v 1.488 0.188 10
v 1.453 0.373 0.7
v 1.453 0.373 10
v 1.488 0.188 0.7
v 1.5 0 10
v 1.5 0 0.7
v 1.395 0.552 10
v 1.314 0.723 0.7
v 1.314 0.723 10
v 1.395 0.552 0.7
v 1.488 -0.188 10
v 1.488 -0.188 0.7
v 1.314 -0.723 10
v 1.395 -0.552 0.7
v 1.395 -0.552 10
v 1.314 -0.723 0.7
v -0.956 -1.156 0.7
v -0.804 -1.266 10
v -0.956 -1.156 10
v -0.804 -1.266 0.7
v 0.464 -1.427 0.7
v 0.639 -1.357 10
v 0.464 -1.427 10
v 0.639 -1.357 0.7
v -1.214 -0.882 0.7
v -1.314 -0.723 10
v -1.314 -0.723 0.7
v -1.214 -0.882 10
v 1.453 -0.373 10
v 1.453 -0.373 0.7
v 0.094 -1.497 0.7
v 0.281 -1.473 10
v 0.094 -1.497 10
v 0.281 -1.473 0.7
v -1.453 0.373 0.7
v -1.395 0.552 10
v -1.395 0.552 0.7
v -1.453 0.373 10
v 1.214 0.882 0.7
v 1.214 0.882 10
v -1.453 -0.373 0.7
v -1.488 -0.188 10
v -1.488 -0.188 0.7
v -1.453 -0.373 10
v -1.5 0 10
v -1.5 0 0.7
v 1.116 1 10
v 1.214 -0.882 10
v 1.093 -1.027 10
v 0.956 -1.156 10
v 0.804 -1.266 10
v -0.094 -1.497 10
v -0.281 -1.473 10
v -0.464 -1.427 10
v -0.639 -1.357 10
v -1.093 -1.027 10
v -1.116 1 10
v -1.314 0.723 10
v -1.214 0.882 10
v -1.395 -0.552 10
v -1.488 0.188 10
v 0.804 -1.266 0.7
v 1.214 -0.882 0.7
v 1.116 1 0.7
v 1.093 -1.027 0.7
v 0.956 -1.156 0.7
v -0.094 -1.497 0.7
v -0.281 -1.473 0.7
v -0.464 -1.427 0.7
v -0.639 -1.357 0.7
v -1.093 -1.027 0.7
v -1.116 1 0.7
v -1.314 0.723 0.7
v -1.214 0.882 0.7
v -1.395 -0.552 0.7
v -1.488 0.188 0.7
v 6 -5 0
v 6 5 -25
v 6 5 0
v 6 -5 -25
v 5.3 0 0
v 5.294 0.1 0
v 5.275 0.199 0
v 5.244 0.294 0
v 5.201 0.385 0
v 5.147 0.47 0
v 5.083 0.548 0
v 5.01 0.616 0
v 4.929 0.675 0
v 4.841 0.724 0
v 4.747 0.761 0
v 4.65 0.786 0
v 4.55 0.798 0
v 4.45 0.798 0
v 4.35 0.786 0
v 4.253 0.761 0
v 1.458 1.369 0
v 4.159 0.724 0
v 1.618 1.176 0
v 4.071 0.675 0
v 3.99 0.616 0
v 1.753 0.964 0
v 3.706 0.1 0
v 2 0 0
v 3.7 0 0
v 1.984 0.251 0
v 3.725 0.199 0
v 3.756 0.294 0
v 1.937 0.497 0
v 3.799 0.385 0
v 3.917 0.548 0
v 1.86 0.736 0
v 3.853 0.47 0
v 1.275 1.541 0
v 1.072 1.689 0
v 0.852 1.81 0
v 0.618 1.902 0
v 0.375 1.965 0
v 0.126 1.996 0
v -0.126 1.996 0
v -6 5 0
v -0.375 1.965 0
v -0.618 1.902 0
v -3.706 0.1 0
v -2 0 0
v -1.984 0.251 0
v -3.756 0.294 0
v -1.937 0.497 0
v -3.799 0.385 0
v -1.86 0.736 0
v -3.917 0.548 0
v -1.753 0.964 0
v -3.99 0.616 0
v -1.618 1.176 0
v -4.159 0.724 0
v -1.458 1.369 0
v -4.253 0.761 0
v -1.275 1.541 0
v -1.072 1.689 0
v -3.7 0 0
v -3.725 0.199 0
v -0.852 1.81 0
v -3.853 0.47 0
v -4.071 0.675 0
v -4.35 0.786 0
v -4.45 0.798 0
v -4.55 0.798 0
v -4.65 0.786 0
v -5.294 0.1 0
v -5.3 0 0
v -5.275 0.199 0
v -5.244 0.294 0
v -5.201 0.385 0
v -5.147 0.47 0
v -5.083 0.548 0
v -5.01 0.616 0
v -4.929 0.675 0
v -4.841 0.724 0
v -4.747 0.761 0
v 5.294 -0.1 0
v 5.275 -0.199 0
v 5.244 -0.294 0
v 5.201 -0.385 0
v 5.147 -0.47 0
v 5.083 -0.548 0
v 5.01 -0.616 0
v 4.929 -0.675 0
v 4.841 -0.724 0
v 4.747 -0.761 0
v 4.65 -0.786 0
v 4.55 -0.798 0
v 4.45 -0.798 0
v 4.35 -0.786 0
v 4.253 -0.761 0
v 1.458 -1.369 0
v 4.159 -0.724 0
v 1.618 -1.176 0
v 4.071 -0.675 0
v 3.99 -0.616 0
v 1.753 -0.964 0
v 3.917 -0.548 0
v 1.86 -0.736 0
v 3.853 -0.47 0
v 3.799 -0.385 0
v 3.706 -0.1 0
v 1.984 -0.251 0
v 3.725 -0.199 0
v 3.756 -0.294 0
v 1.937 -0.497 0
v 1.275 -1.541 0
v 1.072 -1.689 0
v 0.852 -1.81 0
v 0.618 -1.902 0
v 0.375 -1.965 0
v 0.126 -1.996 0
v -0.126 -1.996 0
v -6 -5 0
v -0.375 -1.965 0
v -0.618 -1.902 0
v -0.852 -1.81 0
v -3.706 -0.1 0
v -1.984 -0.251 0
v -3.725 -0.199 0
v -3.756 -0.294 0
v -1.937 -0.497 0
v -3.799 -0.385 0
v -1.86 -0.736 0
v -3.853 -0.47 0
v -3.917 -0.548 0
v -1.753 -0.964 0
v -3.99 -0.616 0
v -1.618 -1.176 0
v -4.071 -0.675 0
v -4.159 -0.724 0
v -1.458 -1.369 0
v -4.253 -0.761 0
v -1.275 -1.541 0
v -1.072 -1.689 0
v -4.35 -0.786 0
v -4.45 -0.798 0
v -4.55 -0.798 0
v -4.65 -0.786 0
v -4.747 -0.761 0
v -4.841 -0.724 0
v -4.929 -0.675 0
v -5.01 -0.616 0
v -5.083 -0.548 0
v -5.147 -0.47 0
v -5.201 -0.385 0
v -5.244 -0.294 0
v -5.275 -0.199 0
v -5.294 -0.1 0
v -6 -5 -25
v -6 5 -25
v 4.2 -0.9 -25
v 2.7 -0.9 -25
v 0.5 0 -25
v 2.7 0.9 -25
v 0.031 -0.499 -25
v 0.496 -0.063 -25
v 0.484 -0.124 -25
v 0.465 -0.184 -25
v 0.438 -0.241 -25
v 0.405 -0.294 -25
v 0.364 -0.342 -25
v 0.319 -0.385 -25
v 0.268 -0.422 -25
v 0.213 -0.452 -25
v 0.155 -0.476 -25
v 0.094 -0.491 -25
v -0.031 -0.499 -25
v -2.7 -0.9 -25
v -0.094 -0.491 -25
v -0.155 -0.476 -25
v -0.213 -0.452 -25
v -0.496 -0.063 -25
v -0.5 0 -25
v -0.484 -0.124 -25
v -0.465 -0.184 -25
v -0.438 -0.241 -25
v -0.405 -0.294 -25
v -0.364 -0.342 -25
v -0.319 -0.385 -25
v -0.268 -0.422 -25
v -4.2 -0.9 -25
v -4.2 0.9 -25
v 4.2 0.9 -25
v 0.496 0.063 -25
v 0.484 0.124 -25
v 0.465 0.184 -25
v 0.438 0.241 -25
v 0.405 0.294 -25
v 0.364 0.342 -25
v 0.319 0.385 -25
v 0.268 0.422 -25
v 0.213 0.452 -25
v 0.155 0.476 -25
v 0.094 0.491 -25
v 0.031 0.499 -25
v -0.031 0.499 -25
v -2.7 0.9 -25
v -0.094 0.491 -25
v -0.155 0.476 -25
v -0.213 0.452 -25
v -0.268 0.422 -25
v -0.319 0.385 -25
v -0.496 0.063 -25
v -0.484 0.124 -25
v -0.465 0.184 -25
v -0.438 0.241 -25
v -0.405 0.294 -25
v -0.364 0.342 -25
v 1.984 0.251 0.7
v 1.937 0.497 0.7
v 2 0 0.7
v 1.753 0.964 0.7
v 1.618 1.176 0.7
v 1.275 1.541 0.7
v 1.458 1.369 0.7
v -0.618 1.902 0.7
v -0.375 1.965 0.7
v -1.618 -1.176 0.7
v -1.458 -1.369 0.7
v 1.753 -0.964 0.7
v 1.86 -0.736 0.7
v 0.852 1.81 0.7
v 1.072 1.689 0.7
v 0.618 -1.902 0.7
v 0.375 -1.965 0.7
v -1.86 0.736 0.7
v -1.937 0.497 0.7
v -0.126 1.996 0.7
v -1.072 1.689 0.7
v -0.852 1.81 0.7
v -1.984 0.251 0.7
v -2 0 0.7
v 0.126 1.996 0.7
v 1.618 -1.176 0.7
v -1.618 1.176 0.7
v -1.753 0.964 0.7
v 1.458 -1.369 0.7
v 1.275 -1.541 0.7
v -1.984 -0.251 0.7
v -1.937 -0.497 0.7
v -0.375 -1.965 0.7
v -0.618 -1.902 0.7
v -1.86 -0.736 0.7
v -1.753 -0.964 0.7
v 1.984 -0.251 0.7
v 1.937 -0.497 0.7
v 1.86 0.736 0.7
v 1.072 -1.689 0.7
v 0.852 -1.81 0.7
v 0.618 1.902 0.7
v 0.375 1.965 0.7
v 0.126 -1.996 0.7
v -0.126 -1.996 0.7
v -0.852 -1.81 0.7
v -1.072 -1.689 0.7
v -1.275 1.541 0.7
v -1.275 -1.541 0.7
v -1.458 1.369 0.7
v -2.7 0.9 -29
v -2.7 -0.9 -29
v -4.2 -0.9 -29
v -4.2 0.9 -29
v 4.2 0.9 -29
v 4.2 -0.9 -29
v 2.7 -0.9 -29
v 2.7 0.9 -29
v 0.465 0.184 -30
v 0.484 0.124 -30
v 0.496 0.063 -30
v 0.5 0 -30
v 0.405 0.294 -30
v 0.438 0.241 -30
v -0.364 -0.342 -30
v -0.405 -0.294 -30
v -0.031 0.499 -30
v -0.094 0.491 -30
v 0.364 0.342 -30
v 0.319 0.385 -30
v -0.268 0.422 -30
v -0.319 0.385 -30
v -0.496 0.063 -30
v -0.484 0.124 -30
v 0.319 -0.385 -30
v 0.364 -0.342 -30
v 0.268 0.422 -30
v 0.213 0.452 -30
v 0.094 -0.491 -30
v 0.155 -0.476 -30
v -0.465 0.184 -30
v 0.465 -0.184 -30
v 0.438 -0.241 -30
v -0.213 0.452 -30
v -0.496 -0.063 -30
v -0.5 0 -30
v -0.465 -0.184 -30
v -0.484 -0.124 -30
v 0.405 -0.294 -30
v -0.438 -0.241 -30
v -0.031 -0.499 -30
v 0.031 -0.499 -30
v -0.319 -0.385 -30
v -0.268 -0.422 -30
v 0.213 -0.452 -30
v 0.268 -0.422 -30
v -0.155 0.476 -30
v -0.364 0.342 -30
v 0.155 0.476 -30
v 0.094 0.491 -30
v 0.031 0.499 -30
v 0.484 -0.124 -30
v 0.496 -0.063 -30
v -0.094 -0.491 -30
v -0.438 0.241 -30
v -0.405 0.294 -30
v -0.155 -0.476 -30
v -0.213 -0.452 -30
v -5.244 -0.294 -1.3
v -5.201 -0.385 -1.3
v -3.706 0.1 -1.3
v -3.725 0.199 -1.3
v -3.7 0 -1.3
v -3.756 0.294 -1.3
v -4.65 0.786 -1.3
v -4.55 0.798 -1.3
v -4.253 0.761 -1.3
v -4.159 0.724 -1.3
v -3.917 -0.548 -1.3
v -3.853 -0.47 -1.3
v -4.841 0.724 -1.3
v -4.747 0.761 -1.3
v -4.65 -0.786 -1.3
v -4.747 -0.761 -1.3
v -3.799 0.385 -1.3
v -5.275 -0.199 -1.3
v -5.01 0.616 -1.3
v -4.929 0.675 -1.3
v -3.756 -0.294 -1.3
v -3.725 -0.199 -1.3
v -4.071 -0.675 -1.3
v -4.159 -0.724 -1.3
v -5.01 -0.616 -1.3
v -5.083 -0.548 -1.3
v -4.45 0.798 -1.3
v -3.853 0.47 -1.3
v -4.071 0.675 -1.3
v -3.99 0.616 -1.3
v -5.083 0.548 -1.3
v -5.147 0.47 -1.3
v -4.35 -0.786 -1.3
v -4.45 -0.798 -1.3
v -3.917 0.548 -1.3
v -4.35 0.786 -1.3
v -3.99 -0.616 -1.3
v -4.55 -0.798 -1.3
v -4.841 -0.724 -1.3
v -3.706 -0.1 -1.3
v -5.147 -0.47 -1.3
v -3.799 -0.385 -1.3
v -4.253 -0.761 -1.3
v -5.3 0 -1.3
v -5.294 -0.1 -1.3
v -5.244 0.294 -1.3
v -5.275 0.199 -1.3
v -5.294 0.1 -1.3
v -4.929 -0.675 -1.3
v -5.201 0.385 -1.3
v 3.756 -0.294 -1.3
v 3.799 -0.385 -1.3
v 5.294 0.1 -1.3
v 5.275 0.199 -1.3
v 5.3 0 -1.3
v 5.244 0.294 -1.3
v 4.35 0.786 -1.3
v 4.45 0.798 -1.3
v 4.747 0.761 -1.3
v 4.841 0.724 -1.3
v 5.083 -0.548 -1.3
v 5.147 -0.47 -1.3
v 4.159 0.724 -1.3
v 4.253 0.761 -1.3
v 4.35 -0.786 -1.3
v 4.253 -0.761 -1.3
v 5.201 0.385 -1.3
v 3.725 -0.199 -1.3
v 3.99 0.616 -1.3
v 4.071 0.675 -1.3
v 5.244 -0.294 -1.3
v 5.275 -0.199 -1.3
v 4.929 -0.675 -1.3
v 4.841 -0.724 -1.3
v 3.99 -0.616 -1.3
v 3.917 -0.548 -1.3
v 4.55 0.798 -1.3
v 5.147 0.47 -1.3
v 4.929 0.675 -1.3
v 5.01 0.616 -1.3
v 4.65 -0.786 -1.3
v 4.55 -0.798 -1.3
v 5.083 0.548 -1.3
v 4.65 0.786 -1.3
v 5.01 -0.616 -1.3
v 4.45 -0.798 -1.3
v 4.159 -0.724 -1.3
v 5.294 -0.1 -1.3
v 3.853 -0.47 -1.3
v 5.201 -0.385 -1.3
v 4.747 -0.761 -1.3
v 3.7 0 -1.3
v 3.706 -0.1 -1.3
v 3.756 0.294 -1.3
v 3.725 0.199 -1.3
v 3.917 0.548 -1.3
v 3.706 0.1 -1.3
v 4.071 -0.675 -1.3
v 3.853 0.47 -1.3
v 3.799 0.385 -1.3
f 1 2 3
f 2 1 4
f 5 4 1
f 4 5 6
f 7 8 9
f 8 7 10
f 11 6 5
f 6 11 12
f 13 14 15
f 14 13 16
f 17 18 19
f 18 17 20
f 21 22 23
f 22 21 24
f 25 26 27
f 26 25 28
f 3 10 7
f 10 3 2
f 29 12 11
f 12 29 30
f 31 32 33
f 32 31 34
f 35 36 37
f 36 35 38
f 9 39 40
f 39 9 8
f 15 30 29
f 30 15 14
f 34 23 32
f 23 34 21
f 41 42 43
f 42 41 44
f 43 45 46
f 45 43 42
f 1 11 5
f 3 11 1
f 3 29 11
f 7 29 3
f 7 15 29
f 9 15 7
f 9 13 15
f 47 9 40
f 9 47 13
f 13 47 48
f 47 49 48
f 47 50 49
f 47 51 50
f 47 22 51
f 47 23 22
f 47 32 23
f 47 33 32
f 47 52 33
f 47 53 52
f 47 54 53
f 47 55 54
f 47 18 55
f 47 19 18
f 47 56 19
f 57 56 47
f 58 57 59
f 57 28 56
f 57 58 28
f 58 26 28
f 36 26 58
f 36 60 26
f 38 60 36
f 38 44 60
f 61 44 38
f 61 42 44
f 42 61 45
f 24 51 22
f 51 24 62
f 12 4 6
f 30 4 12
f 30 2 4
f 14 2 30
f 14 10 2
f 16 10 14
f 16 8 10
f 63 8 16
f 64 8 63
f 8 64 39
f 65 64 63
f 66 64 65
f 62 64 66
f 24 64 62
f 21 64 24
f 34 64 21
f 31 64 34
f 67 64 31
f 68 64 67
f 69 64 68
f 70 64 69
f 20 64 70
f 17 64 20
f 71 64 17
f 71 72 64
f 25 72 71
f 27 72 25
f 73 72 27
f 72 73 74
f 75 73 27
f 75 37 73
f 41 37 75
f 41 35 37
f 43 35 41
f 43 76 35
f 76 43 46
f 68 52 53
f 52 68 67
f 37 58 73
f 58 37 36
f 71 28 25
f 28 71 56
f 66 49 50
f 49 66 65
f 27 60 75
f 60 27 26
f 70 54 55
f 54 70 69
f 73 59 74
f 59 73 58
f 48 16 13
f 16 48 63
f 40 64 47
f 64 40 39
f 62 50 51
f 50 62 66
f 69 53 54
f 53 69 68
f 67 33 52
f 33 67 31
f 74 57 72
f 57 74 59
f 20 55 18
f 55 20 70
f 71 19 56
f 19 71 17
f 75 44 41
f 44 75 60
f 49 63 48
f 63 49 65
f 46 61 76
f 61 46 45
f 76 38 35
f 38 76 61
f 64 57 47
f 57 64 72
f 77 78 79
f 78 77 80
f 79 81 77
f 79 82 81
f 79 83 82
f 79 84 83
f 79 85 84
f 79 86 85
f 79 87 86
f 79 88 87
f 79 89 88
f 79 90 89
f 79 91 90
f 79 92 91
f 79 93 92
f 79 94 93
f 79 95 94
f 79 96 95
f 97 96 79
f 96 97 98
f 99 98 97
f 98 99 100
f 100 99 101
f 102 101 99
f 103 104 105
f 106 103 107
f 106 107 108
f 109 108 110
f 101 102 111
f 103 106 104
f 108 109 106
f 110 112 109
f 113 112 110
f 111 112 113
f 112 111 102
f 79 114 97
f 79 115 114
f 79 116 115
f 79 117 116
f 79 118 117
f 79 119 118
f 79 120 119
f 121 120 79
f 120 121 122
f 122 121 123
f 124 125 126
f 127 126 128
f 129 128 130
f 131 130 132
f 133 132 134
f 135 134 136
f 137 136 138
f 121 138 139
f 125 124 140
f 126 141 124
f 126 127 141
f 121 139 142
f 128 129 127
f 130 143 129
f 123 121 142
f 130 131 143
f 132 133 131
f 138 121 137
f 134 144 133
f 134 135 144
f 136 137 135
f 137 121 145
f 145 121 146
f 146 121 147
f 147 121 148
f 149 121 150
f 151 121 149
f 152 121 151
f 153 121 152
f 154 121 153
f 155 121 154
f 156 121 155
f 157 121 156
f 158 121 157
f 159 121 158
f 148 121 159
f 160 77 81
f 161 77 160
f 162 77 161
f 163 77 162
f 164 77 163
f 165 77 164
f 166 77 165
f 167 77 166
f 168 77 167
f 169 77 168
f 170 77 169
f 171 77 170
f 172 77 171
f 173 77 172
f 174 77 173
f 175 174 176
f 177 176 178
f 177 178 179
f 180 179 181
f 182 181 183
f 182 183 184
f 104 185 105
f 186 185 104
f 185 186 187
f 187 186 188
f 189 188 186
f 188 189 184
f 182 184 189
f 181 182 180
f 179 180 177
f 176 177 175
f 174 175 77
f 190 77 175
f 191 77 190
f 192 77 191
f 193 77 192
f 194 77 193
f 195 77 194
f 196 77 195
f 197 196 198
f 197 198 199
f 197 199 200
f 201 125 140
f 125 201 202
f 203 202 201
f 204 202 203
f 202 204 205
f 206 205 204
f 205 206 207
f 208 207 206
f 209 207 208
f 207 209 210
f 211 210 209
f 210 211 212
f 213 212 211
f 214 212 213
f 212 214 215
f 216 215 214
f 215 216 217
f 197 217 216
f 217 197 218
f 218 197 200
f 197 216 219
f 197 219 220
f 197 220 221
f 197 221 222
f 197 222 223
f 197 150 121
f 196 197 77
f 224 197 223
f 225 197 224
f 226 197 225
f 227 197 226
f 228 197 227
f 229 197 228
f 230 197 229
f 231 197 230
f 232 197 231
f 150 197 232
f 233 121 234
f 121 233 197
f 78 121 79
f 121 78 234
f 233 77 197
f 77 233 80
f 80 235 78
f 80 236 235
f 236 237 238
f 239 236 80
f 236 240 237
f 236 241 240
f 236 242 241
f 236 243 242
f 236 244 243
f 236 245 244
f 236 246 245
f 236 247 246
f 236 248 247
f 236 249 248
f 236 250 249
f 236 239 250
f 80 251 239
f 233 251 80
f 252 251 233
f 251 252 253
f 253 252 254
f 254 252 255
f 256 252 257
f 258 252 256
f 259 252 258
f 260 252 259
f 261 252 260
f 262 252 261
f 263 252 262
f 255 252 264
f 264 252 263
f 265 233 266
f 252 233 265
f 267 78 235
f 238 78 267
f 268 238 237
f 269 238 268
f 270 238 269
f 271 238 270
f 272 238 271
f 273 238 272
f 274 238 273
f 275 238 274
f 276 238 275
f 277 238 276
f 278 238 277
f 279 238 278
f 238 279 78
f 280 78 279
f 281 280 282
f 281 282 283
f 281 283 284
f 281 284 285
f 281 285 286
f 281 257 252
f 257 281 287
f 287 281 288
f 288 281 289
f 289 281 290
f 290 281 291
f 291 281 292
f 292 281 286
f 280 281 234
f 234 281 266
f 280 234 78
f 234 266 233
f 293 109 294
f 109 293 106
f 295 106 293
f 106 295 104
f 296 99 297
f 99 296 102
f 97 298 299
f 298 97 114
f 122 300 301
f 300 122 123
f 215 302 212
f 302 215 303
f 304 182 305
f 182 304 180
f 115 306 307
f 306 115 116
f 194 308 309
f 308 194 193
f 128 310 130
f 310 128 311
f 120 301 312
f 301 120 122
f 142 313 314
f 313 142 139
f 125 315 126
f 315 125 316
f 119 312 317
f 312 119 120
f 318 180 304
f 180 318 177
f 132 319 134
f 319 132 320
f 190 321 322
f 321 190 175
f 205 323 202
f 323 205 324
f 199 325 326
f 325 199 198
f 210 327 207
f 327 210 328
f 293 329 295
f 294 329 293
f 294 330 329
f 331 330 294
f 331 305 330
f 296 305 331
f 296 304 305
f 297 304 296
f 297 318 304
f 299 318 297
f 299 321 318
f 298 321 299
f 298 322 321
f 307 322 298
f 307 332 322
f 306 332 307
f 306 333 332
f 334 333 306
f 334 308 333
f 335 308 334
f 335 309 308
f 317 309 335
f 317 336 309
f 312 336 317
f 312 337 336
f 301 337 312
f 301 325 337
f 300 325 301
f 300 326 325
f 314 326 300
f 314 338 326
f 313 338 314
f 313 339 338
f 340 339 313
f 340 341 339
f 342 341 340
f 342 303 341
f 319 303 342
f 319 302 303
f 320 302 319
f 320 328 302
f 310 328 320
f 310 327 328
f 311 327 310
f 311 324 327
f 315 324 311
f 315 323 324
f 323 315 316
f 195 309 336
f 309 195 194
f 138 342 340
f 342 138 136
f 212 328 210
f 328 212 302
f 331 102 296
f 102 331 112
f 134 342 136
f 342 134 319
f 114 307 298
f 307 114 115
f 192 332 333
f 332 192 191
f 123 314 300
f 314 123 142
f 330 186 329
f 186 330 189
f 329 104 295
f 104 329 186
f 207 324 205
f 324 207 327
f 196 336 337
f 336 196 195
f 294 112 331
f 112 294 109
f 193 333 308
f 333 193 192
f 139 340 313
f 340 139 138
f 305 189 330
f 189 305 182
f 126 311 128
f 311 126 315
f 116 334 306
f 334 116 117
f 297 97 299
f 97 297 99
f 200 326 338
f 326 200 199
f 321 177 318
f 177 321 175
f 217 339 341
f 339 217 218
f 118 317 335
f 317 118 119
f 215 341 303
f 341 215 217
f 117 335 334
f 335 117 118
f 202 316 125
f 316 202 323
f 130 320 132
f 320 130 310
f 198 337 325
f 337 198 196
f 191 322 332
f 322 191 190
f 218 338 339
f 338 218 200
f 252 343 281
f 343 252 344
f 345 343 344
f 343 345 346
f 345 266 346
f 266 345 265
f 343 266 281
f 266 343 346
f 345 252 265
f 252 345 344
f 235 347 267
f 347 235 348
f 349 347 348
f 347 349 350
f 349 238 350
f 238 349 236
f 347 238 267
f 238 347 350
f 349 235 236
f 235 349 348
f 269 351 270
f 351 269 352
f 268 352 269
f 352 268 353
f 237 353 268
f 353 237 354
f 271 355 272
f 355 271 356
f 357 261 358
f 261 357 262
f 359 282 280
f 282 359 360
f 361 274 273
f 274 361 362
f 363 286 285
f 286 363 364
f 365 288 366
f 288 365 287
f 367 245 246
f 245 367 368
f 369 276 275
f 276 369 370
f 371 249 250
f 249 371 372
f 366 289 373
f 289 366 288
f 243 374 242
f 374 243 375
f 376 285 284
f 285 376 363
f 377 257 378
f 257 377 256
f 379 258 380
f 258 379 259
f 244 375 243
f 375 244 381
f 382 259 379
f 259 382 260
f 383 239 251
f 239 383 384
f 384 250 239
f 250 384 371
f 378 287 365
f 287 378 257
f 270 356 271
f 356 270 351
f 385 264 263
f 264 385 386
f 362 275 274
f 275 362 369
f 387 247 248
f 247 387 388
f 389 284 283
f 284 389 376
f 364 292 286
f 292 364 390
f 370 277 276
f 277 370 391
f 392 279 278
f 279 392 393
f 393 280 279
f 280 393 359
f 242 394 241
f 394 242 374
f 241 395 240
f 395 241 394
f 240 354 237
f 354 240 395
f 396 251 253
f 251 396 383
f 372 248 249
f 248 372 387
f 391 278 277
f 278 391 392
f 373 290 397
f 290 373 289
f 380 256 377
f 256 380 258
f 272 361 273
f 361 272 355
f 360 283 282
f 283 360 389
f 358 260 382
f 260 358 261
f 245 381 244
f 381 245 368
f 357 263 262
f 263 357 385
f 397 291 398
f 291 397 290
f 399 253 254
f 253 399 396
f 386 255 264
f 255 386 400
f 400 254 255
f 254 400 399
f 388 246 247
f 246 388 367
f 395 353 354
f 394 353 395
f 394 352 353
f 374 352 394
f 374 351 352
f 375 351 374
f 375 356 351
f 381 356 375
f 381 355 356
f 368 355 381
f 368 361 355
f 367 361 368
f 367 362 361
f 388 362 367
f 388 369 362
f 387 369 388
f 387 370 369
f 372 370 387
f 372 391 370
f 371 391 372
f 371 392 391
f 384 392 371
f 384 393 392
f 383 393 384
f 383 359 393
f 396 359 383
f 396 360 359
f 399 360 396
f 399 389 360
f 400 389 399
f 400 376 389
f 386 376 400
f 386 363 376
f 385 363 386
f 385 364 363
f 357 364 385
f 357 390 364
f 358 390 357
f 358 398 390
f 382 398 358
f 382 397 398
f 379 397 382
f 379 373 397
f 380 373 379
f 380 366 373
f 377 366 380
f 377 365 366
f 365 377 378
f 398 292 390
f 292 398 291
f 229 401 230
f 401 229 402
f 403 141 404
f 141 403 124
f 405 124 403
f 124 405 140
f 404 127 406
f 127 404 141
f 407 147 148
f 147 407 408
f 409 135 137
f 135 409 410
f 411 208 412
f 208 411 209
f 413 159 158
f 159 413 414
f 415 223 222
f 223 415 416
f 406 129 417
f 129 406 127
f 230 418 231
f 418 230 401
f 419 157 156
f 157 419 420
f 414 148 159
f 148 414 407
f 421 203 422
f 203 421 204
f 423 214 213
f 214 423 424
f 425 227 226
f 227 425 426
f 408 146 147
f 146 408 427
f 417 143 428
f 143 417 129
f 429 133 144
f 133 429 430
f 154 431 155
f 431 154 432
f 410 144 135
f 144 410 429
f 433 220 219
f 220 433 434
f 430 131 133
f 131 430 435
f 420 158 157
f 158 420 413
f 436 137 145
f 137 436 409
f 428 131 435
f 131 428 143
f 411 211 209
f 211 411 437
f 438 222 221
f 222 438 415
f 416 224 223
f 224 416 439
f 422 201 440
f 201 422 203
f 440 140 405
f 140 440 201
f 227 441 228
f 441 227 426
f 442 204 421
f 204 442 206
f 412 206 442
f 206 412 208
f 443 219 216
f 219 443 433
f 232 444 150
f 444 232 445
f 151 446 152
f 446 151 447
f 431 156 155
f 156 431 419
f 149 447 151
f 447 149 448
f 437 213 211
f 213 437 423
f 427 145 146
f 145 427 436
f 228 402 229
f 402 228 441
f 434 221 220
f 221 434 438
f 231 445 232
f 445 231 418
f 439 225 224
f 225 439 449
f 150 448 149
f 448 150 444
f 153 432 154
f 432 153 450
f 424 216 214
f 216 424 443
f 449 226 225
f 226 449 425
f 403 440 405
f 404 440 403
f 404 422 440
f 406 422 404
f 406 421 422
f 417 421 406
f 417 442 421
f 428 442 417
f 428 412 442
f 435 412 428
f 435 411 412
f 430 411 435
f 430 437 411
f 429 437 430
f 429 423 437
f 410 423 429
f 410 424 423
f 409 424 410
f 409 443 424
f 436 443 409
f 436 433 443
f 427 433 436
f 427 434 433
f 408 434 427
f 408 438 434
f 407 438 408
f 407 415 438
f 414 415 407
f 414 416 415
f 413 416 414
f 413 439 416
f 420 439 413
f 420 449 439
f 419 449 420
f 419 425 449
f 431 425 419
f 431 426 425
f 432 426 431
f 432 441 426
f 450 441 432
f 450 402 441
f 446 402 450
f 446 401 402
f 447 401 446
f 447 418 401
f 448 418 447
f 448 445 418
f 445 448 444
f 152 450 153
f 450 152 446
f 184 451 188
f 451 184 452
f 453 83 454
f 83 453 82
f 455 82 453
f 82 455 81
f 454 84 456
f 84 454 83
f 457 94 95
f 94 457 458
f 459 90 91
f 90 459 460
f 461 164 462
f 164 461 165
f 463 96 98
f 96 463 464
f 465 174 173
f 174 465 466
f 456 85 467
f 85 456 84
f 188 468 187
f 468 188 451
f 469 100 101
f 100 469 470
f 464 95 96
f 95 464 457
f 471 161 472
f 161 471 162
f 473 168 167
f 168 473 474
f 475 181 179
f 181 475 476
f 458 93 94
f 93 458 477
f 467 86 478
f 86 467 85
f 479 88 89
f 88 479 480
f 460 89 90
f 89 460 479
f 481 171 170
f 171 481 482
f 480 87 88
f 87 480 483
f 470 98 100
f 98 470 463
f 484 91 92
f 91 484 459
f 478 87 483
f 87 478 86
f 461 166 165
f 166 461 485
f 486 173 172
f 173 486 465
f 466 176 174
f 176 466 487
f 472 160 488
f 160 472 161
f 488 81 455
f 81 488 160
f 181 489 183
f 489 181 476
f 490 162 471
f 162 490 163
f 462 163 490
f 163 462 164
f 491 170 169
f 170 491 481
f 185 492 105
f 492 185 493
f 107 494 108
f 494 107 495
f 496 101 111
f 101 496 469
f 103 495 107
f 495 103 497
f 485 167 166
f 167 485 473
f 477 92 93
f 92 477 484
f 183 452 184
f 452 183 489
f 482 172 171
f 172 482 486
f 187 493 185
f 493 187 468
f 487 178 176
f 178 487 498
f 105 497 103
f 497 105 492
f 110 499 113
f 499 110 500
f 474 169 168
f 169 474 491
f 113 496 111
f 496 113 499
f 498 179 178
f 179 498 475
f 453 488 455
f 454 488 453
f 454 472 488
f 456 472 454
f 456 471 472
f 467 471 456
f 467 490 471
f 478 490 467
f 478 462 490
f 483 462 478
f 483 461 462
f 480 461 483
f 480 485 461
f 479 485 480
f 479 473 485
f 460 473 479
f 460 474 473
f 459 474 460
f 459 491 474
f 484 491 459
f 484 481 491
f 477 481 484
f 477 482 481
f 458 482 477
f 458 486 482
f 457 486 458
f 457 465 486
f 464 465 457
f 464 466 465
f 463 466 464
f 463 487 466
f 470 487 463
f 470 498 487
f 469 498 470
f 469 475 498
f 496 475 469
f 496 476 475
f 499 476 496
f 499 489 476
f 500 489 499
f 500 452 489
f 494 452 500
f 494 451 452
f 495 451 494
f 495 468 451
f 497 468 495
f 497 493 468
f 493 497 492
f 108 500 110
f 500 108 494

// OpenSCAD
$fn = 50;

difference() {
	union() {
		translate(v = [0, 0, 0.7]) {
			rotate(a = [0, 0, 0]) {
				difference() {
					union() {
						cylinder(h = 9.3, r = 1.5);
					}
					union() {
						translate(v = [-6.0, 1.0, -1]) {
							cube(size = [12, 12, 11.3]);
						}
					}
				}
			}
		}
		translate(v = [-6.0, -5.0, -9]) {
			cube(size = [12, 10, 9]);
		}
		translate(v = [-6.0, -5.0, -25]) {
			cube(size = [12, 10, 16]);
		}
		cylinder(h = 0.7, r = 2.0);
		translate(v = [-4.2, -0.9, -29]) {
			cube(size = [1.5, 1.8, 4]);
		}
		translate(v = [2.7, -0.9, -29]) {
			cube(size = [1.5, 1.8, 4]);
		}
		translate(v = [0, 0, -30.0]) {
			cylinder(h = 5, r = 0.5);
		}
	}
	union() {
		translate(v = [-4.5, 0, -1.3]) {
			cylinder(h = 1.31, r = 0.8);
		}
		translate(v = [4.5, 0, -1.3]) {
			cylinder(h = 1.31, r = 0.8);
		}
	}
}
